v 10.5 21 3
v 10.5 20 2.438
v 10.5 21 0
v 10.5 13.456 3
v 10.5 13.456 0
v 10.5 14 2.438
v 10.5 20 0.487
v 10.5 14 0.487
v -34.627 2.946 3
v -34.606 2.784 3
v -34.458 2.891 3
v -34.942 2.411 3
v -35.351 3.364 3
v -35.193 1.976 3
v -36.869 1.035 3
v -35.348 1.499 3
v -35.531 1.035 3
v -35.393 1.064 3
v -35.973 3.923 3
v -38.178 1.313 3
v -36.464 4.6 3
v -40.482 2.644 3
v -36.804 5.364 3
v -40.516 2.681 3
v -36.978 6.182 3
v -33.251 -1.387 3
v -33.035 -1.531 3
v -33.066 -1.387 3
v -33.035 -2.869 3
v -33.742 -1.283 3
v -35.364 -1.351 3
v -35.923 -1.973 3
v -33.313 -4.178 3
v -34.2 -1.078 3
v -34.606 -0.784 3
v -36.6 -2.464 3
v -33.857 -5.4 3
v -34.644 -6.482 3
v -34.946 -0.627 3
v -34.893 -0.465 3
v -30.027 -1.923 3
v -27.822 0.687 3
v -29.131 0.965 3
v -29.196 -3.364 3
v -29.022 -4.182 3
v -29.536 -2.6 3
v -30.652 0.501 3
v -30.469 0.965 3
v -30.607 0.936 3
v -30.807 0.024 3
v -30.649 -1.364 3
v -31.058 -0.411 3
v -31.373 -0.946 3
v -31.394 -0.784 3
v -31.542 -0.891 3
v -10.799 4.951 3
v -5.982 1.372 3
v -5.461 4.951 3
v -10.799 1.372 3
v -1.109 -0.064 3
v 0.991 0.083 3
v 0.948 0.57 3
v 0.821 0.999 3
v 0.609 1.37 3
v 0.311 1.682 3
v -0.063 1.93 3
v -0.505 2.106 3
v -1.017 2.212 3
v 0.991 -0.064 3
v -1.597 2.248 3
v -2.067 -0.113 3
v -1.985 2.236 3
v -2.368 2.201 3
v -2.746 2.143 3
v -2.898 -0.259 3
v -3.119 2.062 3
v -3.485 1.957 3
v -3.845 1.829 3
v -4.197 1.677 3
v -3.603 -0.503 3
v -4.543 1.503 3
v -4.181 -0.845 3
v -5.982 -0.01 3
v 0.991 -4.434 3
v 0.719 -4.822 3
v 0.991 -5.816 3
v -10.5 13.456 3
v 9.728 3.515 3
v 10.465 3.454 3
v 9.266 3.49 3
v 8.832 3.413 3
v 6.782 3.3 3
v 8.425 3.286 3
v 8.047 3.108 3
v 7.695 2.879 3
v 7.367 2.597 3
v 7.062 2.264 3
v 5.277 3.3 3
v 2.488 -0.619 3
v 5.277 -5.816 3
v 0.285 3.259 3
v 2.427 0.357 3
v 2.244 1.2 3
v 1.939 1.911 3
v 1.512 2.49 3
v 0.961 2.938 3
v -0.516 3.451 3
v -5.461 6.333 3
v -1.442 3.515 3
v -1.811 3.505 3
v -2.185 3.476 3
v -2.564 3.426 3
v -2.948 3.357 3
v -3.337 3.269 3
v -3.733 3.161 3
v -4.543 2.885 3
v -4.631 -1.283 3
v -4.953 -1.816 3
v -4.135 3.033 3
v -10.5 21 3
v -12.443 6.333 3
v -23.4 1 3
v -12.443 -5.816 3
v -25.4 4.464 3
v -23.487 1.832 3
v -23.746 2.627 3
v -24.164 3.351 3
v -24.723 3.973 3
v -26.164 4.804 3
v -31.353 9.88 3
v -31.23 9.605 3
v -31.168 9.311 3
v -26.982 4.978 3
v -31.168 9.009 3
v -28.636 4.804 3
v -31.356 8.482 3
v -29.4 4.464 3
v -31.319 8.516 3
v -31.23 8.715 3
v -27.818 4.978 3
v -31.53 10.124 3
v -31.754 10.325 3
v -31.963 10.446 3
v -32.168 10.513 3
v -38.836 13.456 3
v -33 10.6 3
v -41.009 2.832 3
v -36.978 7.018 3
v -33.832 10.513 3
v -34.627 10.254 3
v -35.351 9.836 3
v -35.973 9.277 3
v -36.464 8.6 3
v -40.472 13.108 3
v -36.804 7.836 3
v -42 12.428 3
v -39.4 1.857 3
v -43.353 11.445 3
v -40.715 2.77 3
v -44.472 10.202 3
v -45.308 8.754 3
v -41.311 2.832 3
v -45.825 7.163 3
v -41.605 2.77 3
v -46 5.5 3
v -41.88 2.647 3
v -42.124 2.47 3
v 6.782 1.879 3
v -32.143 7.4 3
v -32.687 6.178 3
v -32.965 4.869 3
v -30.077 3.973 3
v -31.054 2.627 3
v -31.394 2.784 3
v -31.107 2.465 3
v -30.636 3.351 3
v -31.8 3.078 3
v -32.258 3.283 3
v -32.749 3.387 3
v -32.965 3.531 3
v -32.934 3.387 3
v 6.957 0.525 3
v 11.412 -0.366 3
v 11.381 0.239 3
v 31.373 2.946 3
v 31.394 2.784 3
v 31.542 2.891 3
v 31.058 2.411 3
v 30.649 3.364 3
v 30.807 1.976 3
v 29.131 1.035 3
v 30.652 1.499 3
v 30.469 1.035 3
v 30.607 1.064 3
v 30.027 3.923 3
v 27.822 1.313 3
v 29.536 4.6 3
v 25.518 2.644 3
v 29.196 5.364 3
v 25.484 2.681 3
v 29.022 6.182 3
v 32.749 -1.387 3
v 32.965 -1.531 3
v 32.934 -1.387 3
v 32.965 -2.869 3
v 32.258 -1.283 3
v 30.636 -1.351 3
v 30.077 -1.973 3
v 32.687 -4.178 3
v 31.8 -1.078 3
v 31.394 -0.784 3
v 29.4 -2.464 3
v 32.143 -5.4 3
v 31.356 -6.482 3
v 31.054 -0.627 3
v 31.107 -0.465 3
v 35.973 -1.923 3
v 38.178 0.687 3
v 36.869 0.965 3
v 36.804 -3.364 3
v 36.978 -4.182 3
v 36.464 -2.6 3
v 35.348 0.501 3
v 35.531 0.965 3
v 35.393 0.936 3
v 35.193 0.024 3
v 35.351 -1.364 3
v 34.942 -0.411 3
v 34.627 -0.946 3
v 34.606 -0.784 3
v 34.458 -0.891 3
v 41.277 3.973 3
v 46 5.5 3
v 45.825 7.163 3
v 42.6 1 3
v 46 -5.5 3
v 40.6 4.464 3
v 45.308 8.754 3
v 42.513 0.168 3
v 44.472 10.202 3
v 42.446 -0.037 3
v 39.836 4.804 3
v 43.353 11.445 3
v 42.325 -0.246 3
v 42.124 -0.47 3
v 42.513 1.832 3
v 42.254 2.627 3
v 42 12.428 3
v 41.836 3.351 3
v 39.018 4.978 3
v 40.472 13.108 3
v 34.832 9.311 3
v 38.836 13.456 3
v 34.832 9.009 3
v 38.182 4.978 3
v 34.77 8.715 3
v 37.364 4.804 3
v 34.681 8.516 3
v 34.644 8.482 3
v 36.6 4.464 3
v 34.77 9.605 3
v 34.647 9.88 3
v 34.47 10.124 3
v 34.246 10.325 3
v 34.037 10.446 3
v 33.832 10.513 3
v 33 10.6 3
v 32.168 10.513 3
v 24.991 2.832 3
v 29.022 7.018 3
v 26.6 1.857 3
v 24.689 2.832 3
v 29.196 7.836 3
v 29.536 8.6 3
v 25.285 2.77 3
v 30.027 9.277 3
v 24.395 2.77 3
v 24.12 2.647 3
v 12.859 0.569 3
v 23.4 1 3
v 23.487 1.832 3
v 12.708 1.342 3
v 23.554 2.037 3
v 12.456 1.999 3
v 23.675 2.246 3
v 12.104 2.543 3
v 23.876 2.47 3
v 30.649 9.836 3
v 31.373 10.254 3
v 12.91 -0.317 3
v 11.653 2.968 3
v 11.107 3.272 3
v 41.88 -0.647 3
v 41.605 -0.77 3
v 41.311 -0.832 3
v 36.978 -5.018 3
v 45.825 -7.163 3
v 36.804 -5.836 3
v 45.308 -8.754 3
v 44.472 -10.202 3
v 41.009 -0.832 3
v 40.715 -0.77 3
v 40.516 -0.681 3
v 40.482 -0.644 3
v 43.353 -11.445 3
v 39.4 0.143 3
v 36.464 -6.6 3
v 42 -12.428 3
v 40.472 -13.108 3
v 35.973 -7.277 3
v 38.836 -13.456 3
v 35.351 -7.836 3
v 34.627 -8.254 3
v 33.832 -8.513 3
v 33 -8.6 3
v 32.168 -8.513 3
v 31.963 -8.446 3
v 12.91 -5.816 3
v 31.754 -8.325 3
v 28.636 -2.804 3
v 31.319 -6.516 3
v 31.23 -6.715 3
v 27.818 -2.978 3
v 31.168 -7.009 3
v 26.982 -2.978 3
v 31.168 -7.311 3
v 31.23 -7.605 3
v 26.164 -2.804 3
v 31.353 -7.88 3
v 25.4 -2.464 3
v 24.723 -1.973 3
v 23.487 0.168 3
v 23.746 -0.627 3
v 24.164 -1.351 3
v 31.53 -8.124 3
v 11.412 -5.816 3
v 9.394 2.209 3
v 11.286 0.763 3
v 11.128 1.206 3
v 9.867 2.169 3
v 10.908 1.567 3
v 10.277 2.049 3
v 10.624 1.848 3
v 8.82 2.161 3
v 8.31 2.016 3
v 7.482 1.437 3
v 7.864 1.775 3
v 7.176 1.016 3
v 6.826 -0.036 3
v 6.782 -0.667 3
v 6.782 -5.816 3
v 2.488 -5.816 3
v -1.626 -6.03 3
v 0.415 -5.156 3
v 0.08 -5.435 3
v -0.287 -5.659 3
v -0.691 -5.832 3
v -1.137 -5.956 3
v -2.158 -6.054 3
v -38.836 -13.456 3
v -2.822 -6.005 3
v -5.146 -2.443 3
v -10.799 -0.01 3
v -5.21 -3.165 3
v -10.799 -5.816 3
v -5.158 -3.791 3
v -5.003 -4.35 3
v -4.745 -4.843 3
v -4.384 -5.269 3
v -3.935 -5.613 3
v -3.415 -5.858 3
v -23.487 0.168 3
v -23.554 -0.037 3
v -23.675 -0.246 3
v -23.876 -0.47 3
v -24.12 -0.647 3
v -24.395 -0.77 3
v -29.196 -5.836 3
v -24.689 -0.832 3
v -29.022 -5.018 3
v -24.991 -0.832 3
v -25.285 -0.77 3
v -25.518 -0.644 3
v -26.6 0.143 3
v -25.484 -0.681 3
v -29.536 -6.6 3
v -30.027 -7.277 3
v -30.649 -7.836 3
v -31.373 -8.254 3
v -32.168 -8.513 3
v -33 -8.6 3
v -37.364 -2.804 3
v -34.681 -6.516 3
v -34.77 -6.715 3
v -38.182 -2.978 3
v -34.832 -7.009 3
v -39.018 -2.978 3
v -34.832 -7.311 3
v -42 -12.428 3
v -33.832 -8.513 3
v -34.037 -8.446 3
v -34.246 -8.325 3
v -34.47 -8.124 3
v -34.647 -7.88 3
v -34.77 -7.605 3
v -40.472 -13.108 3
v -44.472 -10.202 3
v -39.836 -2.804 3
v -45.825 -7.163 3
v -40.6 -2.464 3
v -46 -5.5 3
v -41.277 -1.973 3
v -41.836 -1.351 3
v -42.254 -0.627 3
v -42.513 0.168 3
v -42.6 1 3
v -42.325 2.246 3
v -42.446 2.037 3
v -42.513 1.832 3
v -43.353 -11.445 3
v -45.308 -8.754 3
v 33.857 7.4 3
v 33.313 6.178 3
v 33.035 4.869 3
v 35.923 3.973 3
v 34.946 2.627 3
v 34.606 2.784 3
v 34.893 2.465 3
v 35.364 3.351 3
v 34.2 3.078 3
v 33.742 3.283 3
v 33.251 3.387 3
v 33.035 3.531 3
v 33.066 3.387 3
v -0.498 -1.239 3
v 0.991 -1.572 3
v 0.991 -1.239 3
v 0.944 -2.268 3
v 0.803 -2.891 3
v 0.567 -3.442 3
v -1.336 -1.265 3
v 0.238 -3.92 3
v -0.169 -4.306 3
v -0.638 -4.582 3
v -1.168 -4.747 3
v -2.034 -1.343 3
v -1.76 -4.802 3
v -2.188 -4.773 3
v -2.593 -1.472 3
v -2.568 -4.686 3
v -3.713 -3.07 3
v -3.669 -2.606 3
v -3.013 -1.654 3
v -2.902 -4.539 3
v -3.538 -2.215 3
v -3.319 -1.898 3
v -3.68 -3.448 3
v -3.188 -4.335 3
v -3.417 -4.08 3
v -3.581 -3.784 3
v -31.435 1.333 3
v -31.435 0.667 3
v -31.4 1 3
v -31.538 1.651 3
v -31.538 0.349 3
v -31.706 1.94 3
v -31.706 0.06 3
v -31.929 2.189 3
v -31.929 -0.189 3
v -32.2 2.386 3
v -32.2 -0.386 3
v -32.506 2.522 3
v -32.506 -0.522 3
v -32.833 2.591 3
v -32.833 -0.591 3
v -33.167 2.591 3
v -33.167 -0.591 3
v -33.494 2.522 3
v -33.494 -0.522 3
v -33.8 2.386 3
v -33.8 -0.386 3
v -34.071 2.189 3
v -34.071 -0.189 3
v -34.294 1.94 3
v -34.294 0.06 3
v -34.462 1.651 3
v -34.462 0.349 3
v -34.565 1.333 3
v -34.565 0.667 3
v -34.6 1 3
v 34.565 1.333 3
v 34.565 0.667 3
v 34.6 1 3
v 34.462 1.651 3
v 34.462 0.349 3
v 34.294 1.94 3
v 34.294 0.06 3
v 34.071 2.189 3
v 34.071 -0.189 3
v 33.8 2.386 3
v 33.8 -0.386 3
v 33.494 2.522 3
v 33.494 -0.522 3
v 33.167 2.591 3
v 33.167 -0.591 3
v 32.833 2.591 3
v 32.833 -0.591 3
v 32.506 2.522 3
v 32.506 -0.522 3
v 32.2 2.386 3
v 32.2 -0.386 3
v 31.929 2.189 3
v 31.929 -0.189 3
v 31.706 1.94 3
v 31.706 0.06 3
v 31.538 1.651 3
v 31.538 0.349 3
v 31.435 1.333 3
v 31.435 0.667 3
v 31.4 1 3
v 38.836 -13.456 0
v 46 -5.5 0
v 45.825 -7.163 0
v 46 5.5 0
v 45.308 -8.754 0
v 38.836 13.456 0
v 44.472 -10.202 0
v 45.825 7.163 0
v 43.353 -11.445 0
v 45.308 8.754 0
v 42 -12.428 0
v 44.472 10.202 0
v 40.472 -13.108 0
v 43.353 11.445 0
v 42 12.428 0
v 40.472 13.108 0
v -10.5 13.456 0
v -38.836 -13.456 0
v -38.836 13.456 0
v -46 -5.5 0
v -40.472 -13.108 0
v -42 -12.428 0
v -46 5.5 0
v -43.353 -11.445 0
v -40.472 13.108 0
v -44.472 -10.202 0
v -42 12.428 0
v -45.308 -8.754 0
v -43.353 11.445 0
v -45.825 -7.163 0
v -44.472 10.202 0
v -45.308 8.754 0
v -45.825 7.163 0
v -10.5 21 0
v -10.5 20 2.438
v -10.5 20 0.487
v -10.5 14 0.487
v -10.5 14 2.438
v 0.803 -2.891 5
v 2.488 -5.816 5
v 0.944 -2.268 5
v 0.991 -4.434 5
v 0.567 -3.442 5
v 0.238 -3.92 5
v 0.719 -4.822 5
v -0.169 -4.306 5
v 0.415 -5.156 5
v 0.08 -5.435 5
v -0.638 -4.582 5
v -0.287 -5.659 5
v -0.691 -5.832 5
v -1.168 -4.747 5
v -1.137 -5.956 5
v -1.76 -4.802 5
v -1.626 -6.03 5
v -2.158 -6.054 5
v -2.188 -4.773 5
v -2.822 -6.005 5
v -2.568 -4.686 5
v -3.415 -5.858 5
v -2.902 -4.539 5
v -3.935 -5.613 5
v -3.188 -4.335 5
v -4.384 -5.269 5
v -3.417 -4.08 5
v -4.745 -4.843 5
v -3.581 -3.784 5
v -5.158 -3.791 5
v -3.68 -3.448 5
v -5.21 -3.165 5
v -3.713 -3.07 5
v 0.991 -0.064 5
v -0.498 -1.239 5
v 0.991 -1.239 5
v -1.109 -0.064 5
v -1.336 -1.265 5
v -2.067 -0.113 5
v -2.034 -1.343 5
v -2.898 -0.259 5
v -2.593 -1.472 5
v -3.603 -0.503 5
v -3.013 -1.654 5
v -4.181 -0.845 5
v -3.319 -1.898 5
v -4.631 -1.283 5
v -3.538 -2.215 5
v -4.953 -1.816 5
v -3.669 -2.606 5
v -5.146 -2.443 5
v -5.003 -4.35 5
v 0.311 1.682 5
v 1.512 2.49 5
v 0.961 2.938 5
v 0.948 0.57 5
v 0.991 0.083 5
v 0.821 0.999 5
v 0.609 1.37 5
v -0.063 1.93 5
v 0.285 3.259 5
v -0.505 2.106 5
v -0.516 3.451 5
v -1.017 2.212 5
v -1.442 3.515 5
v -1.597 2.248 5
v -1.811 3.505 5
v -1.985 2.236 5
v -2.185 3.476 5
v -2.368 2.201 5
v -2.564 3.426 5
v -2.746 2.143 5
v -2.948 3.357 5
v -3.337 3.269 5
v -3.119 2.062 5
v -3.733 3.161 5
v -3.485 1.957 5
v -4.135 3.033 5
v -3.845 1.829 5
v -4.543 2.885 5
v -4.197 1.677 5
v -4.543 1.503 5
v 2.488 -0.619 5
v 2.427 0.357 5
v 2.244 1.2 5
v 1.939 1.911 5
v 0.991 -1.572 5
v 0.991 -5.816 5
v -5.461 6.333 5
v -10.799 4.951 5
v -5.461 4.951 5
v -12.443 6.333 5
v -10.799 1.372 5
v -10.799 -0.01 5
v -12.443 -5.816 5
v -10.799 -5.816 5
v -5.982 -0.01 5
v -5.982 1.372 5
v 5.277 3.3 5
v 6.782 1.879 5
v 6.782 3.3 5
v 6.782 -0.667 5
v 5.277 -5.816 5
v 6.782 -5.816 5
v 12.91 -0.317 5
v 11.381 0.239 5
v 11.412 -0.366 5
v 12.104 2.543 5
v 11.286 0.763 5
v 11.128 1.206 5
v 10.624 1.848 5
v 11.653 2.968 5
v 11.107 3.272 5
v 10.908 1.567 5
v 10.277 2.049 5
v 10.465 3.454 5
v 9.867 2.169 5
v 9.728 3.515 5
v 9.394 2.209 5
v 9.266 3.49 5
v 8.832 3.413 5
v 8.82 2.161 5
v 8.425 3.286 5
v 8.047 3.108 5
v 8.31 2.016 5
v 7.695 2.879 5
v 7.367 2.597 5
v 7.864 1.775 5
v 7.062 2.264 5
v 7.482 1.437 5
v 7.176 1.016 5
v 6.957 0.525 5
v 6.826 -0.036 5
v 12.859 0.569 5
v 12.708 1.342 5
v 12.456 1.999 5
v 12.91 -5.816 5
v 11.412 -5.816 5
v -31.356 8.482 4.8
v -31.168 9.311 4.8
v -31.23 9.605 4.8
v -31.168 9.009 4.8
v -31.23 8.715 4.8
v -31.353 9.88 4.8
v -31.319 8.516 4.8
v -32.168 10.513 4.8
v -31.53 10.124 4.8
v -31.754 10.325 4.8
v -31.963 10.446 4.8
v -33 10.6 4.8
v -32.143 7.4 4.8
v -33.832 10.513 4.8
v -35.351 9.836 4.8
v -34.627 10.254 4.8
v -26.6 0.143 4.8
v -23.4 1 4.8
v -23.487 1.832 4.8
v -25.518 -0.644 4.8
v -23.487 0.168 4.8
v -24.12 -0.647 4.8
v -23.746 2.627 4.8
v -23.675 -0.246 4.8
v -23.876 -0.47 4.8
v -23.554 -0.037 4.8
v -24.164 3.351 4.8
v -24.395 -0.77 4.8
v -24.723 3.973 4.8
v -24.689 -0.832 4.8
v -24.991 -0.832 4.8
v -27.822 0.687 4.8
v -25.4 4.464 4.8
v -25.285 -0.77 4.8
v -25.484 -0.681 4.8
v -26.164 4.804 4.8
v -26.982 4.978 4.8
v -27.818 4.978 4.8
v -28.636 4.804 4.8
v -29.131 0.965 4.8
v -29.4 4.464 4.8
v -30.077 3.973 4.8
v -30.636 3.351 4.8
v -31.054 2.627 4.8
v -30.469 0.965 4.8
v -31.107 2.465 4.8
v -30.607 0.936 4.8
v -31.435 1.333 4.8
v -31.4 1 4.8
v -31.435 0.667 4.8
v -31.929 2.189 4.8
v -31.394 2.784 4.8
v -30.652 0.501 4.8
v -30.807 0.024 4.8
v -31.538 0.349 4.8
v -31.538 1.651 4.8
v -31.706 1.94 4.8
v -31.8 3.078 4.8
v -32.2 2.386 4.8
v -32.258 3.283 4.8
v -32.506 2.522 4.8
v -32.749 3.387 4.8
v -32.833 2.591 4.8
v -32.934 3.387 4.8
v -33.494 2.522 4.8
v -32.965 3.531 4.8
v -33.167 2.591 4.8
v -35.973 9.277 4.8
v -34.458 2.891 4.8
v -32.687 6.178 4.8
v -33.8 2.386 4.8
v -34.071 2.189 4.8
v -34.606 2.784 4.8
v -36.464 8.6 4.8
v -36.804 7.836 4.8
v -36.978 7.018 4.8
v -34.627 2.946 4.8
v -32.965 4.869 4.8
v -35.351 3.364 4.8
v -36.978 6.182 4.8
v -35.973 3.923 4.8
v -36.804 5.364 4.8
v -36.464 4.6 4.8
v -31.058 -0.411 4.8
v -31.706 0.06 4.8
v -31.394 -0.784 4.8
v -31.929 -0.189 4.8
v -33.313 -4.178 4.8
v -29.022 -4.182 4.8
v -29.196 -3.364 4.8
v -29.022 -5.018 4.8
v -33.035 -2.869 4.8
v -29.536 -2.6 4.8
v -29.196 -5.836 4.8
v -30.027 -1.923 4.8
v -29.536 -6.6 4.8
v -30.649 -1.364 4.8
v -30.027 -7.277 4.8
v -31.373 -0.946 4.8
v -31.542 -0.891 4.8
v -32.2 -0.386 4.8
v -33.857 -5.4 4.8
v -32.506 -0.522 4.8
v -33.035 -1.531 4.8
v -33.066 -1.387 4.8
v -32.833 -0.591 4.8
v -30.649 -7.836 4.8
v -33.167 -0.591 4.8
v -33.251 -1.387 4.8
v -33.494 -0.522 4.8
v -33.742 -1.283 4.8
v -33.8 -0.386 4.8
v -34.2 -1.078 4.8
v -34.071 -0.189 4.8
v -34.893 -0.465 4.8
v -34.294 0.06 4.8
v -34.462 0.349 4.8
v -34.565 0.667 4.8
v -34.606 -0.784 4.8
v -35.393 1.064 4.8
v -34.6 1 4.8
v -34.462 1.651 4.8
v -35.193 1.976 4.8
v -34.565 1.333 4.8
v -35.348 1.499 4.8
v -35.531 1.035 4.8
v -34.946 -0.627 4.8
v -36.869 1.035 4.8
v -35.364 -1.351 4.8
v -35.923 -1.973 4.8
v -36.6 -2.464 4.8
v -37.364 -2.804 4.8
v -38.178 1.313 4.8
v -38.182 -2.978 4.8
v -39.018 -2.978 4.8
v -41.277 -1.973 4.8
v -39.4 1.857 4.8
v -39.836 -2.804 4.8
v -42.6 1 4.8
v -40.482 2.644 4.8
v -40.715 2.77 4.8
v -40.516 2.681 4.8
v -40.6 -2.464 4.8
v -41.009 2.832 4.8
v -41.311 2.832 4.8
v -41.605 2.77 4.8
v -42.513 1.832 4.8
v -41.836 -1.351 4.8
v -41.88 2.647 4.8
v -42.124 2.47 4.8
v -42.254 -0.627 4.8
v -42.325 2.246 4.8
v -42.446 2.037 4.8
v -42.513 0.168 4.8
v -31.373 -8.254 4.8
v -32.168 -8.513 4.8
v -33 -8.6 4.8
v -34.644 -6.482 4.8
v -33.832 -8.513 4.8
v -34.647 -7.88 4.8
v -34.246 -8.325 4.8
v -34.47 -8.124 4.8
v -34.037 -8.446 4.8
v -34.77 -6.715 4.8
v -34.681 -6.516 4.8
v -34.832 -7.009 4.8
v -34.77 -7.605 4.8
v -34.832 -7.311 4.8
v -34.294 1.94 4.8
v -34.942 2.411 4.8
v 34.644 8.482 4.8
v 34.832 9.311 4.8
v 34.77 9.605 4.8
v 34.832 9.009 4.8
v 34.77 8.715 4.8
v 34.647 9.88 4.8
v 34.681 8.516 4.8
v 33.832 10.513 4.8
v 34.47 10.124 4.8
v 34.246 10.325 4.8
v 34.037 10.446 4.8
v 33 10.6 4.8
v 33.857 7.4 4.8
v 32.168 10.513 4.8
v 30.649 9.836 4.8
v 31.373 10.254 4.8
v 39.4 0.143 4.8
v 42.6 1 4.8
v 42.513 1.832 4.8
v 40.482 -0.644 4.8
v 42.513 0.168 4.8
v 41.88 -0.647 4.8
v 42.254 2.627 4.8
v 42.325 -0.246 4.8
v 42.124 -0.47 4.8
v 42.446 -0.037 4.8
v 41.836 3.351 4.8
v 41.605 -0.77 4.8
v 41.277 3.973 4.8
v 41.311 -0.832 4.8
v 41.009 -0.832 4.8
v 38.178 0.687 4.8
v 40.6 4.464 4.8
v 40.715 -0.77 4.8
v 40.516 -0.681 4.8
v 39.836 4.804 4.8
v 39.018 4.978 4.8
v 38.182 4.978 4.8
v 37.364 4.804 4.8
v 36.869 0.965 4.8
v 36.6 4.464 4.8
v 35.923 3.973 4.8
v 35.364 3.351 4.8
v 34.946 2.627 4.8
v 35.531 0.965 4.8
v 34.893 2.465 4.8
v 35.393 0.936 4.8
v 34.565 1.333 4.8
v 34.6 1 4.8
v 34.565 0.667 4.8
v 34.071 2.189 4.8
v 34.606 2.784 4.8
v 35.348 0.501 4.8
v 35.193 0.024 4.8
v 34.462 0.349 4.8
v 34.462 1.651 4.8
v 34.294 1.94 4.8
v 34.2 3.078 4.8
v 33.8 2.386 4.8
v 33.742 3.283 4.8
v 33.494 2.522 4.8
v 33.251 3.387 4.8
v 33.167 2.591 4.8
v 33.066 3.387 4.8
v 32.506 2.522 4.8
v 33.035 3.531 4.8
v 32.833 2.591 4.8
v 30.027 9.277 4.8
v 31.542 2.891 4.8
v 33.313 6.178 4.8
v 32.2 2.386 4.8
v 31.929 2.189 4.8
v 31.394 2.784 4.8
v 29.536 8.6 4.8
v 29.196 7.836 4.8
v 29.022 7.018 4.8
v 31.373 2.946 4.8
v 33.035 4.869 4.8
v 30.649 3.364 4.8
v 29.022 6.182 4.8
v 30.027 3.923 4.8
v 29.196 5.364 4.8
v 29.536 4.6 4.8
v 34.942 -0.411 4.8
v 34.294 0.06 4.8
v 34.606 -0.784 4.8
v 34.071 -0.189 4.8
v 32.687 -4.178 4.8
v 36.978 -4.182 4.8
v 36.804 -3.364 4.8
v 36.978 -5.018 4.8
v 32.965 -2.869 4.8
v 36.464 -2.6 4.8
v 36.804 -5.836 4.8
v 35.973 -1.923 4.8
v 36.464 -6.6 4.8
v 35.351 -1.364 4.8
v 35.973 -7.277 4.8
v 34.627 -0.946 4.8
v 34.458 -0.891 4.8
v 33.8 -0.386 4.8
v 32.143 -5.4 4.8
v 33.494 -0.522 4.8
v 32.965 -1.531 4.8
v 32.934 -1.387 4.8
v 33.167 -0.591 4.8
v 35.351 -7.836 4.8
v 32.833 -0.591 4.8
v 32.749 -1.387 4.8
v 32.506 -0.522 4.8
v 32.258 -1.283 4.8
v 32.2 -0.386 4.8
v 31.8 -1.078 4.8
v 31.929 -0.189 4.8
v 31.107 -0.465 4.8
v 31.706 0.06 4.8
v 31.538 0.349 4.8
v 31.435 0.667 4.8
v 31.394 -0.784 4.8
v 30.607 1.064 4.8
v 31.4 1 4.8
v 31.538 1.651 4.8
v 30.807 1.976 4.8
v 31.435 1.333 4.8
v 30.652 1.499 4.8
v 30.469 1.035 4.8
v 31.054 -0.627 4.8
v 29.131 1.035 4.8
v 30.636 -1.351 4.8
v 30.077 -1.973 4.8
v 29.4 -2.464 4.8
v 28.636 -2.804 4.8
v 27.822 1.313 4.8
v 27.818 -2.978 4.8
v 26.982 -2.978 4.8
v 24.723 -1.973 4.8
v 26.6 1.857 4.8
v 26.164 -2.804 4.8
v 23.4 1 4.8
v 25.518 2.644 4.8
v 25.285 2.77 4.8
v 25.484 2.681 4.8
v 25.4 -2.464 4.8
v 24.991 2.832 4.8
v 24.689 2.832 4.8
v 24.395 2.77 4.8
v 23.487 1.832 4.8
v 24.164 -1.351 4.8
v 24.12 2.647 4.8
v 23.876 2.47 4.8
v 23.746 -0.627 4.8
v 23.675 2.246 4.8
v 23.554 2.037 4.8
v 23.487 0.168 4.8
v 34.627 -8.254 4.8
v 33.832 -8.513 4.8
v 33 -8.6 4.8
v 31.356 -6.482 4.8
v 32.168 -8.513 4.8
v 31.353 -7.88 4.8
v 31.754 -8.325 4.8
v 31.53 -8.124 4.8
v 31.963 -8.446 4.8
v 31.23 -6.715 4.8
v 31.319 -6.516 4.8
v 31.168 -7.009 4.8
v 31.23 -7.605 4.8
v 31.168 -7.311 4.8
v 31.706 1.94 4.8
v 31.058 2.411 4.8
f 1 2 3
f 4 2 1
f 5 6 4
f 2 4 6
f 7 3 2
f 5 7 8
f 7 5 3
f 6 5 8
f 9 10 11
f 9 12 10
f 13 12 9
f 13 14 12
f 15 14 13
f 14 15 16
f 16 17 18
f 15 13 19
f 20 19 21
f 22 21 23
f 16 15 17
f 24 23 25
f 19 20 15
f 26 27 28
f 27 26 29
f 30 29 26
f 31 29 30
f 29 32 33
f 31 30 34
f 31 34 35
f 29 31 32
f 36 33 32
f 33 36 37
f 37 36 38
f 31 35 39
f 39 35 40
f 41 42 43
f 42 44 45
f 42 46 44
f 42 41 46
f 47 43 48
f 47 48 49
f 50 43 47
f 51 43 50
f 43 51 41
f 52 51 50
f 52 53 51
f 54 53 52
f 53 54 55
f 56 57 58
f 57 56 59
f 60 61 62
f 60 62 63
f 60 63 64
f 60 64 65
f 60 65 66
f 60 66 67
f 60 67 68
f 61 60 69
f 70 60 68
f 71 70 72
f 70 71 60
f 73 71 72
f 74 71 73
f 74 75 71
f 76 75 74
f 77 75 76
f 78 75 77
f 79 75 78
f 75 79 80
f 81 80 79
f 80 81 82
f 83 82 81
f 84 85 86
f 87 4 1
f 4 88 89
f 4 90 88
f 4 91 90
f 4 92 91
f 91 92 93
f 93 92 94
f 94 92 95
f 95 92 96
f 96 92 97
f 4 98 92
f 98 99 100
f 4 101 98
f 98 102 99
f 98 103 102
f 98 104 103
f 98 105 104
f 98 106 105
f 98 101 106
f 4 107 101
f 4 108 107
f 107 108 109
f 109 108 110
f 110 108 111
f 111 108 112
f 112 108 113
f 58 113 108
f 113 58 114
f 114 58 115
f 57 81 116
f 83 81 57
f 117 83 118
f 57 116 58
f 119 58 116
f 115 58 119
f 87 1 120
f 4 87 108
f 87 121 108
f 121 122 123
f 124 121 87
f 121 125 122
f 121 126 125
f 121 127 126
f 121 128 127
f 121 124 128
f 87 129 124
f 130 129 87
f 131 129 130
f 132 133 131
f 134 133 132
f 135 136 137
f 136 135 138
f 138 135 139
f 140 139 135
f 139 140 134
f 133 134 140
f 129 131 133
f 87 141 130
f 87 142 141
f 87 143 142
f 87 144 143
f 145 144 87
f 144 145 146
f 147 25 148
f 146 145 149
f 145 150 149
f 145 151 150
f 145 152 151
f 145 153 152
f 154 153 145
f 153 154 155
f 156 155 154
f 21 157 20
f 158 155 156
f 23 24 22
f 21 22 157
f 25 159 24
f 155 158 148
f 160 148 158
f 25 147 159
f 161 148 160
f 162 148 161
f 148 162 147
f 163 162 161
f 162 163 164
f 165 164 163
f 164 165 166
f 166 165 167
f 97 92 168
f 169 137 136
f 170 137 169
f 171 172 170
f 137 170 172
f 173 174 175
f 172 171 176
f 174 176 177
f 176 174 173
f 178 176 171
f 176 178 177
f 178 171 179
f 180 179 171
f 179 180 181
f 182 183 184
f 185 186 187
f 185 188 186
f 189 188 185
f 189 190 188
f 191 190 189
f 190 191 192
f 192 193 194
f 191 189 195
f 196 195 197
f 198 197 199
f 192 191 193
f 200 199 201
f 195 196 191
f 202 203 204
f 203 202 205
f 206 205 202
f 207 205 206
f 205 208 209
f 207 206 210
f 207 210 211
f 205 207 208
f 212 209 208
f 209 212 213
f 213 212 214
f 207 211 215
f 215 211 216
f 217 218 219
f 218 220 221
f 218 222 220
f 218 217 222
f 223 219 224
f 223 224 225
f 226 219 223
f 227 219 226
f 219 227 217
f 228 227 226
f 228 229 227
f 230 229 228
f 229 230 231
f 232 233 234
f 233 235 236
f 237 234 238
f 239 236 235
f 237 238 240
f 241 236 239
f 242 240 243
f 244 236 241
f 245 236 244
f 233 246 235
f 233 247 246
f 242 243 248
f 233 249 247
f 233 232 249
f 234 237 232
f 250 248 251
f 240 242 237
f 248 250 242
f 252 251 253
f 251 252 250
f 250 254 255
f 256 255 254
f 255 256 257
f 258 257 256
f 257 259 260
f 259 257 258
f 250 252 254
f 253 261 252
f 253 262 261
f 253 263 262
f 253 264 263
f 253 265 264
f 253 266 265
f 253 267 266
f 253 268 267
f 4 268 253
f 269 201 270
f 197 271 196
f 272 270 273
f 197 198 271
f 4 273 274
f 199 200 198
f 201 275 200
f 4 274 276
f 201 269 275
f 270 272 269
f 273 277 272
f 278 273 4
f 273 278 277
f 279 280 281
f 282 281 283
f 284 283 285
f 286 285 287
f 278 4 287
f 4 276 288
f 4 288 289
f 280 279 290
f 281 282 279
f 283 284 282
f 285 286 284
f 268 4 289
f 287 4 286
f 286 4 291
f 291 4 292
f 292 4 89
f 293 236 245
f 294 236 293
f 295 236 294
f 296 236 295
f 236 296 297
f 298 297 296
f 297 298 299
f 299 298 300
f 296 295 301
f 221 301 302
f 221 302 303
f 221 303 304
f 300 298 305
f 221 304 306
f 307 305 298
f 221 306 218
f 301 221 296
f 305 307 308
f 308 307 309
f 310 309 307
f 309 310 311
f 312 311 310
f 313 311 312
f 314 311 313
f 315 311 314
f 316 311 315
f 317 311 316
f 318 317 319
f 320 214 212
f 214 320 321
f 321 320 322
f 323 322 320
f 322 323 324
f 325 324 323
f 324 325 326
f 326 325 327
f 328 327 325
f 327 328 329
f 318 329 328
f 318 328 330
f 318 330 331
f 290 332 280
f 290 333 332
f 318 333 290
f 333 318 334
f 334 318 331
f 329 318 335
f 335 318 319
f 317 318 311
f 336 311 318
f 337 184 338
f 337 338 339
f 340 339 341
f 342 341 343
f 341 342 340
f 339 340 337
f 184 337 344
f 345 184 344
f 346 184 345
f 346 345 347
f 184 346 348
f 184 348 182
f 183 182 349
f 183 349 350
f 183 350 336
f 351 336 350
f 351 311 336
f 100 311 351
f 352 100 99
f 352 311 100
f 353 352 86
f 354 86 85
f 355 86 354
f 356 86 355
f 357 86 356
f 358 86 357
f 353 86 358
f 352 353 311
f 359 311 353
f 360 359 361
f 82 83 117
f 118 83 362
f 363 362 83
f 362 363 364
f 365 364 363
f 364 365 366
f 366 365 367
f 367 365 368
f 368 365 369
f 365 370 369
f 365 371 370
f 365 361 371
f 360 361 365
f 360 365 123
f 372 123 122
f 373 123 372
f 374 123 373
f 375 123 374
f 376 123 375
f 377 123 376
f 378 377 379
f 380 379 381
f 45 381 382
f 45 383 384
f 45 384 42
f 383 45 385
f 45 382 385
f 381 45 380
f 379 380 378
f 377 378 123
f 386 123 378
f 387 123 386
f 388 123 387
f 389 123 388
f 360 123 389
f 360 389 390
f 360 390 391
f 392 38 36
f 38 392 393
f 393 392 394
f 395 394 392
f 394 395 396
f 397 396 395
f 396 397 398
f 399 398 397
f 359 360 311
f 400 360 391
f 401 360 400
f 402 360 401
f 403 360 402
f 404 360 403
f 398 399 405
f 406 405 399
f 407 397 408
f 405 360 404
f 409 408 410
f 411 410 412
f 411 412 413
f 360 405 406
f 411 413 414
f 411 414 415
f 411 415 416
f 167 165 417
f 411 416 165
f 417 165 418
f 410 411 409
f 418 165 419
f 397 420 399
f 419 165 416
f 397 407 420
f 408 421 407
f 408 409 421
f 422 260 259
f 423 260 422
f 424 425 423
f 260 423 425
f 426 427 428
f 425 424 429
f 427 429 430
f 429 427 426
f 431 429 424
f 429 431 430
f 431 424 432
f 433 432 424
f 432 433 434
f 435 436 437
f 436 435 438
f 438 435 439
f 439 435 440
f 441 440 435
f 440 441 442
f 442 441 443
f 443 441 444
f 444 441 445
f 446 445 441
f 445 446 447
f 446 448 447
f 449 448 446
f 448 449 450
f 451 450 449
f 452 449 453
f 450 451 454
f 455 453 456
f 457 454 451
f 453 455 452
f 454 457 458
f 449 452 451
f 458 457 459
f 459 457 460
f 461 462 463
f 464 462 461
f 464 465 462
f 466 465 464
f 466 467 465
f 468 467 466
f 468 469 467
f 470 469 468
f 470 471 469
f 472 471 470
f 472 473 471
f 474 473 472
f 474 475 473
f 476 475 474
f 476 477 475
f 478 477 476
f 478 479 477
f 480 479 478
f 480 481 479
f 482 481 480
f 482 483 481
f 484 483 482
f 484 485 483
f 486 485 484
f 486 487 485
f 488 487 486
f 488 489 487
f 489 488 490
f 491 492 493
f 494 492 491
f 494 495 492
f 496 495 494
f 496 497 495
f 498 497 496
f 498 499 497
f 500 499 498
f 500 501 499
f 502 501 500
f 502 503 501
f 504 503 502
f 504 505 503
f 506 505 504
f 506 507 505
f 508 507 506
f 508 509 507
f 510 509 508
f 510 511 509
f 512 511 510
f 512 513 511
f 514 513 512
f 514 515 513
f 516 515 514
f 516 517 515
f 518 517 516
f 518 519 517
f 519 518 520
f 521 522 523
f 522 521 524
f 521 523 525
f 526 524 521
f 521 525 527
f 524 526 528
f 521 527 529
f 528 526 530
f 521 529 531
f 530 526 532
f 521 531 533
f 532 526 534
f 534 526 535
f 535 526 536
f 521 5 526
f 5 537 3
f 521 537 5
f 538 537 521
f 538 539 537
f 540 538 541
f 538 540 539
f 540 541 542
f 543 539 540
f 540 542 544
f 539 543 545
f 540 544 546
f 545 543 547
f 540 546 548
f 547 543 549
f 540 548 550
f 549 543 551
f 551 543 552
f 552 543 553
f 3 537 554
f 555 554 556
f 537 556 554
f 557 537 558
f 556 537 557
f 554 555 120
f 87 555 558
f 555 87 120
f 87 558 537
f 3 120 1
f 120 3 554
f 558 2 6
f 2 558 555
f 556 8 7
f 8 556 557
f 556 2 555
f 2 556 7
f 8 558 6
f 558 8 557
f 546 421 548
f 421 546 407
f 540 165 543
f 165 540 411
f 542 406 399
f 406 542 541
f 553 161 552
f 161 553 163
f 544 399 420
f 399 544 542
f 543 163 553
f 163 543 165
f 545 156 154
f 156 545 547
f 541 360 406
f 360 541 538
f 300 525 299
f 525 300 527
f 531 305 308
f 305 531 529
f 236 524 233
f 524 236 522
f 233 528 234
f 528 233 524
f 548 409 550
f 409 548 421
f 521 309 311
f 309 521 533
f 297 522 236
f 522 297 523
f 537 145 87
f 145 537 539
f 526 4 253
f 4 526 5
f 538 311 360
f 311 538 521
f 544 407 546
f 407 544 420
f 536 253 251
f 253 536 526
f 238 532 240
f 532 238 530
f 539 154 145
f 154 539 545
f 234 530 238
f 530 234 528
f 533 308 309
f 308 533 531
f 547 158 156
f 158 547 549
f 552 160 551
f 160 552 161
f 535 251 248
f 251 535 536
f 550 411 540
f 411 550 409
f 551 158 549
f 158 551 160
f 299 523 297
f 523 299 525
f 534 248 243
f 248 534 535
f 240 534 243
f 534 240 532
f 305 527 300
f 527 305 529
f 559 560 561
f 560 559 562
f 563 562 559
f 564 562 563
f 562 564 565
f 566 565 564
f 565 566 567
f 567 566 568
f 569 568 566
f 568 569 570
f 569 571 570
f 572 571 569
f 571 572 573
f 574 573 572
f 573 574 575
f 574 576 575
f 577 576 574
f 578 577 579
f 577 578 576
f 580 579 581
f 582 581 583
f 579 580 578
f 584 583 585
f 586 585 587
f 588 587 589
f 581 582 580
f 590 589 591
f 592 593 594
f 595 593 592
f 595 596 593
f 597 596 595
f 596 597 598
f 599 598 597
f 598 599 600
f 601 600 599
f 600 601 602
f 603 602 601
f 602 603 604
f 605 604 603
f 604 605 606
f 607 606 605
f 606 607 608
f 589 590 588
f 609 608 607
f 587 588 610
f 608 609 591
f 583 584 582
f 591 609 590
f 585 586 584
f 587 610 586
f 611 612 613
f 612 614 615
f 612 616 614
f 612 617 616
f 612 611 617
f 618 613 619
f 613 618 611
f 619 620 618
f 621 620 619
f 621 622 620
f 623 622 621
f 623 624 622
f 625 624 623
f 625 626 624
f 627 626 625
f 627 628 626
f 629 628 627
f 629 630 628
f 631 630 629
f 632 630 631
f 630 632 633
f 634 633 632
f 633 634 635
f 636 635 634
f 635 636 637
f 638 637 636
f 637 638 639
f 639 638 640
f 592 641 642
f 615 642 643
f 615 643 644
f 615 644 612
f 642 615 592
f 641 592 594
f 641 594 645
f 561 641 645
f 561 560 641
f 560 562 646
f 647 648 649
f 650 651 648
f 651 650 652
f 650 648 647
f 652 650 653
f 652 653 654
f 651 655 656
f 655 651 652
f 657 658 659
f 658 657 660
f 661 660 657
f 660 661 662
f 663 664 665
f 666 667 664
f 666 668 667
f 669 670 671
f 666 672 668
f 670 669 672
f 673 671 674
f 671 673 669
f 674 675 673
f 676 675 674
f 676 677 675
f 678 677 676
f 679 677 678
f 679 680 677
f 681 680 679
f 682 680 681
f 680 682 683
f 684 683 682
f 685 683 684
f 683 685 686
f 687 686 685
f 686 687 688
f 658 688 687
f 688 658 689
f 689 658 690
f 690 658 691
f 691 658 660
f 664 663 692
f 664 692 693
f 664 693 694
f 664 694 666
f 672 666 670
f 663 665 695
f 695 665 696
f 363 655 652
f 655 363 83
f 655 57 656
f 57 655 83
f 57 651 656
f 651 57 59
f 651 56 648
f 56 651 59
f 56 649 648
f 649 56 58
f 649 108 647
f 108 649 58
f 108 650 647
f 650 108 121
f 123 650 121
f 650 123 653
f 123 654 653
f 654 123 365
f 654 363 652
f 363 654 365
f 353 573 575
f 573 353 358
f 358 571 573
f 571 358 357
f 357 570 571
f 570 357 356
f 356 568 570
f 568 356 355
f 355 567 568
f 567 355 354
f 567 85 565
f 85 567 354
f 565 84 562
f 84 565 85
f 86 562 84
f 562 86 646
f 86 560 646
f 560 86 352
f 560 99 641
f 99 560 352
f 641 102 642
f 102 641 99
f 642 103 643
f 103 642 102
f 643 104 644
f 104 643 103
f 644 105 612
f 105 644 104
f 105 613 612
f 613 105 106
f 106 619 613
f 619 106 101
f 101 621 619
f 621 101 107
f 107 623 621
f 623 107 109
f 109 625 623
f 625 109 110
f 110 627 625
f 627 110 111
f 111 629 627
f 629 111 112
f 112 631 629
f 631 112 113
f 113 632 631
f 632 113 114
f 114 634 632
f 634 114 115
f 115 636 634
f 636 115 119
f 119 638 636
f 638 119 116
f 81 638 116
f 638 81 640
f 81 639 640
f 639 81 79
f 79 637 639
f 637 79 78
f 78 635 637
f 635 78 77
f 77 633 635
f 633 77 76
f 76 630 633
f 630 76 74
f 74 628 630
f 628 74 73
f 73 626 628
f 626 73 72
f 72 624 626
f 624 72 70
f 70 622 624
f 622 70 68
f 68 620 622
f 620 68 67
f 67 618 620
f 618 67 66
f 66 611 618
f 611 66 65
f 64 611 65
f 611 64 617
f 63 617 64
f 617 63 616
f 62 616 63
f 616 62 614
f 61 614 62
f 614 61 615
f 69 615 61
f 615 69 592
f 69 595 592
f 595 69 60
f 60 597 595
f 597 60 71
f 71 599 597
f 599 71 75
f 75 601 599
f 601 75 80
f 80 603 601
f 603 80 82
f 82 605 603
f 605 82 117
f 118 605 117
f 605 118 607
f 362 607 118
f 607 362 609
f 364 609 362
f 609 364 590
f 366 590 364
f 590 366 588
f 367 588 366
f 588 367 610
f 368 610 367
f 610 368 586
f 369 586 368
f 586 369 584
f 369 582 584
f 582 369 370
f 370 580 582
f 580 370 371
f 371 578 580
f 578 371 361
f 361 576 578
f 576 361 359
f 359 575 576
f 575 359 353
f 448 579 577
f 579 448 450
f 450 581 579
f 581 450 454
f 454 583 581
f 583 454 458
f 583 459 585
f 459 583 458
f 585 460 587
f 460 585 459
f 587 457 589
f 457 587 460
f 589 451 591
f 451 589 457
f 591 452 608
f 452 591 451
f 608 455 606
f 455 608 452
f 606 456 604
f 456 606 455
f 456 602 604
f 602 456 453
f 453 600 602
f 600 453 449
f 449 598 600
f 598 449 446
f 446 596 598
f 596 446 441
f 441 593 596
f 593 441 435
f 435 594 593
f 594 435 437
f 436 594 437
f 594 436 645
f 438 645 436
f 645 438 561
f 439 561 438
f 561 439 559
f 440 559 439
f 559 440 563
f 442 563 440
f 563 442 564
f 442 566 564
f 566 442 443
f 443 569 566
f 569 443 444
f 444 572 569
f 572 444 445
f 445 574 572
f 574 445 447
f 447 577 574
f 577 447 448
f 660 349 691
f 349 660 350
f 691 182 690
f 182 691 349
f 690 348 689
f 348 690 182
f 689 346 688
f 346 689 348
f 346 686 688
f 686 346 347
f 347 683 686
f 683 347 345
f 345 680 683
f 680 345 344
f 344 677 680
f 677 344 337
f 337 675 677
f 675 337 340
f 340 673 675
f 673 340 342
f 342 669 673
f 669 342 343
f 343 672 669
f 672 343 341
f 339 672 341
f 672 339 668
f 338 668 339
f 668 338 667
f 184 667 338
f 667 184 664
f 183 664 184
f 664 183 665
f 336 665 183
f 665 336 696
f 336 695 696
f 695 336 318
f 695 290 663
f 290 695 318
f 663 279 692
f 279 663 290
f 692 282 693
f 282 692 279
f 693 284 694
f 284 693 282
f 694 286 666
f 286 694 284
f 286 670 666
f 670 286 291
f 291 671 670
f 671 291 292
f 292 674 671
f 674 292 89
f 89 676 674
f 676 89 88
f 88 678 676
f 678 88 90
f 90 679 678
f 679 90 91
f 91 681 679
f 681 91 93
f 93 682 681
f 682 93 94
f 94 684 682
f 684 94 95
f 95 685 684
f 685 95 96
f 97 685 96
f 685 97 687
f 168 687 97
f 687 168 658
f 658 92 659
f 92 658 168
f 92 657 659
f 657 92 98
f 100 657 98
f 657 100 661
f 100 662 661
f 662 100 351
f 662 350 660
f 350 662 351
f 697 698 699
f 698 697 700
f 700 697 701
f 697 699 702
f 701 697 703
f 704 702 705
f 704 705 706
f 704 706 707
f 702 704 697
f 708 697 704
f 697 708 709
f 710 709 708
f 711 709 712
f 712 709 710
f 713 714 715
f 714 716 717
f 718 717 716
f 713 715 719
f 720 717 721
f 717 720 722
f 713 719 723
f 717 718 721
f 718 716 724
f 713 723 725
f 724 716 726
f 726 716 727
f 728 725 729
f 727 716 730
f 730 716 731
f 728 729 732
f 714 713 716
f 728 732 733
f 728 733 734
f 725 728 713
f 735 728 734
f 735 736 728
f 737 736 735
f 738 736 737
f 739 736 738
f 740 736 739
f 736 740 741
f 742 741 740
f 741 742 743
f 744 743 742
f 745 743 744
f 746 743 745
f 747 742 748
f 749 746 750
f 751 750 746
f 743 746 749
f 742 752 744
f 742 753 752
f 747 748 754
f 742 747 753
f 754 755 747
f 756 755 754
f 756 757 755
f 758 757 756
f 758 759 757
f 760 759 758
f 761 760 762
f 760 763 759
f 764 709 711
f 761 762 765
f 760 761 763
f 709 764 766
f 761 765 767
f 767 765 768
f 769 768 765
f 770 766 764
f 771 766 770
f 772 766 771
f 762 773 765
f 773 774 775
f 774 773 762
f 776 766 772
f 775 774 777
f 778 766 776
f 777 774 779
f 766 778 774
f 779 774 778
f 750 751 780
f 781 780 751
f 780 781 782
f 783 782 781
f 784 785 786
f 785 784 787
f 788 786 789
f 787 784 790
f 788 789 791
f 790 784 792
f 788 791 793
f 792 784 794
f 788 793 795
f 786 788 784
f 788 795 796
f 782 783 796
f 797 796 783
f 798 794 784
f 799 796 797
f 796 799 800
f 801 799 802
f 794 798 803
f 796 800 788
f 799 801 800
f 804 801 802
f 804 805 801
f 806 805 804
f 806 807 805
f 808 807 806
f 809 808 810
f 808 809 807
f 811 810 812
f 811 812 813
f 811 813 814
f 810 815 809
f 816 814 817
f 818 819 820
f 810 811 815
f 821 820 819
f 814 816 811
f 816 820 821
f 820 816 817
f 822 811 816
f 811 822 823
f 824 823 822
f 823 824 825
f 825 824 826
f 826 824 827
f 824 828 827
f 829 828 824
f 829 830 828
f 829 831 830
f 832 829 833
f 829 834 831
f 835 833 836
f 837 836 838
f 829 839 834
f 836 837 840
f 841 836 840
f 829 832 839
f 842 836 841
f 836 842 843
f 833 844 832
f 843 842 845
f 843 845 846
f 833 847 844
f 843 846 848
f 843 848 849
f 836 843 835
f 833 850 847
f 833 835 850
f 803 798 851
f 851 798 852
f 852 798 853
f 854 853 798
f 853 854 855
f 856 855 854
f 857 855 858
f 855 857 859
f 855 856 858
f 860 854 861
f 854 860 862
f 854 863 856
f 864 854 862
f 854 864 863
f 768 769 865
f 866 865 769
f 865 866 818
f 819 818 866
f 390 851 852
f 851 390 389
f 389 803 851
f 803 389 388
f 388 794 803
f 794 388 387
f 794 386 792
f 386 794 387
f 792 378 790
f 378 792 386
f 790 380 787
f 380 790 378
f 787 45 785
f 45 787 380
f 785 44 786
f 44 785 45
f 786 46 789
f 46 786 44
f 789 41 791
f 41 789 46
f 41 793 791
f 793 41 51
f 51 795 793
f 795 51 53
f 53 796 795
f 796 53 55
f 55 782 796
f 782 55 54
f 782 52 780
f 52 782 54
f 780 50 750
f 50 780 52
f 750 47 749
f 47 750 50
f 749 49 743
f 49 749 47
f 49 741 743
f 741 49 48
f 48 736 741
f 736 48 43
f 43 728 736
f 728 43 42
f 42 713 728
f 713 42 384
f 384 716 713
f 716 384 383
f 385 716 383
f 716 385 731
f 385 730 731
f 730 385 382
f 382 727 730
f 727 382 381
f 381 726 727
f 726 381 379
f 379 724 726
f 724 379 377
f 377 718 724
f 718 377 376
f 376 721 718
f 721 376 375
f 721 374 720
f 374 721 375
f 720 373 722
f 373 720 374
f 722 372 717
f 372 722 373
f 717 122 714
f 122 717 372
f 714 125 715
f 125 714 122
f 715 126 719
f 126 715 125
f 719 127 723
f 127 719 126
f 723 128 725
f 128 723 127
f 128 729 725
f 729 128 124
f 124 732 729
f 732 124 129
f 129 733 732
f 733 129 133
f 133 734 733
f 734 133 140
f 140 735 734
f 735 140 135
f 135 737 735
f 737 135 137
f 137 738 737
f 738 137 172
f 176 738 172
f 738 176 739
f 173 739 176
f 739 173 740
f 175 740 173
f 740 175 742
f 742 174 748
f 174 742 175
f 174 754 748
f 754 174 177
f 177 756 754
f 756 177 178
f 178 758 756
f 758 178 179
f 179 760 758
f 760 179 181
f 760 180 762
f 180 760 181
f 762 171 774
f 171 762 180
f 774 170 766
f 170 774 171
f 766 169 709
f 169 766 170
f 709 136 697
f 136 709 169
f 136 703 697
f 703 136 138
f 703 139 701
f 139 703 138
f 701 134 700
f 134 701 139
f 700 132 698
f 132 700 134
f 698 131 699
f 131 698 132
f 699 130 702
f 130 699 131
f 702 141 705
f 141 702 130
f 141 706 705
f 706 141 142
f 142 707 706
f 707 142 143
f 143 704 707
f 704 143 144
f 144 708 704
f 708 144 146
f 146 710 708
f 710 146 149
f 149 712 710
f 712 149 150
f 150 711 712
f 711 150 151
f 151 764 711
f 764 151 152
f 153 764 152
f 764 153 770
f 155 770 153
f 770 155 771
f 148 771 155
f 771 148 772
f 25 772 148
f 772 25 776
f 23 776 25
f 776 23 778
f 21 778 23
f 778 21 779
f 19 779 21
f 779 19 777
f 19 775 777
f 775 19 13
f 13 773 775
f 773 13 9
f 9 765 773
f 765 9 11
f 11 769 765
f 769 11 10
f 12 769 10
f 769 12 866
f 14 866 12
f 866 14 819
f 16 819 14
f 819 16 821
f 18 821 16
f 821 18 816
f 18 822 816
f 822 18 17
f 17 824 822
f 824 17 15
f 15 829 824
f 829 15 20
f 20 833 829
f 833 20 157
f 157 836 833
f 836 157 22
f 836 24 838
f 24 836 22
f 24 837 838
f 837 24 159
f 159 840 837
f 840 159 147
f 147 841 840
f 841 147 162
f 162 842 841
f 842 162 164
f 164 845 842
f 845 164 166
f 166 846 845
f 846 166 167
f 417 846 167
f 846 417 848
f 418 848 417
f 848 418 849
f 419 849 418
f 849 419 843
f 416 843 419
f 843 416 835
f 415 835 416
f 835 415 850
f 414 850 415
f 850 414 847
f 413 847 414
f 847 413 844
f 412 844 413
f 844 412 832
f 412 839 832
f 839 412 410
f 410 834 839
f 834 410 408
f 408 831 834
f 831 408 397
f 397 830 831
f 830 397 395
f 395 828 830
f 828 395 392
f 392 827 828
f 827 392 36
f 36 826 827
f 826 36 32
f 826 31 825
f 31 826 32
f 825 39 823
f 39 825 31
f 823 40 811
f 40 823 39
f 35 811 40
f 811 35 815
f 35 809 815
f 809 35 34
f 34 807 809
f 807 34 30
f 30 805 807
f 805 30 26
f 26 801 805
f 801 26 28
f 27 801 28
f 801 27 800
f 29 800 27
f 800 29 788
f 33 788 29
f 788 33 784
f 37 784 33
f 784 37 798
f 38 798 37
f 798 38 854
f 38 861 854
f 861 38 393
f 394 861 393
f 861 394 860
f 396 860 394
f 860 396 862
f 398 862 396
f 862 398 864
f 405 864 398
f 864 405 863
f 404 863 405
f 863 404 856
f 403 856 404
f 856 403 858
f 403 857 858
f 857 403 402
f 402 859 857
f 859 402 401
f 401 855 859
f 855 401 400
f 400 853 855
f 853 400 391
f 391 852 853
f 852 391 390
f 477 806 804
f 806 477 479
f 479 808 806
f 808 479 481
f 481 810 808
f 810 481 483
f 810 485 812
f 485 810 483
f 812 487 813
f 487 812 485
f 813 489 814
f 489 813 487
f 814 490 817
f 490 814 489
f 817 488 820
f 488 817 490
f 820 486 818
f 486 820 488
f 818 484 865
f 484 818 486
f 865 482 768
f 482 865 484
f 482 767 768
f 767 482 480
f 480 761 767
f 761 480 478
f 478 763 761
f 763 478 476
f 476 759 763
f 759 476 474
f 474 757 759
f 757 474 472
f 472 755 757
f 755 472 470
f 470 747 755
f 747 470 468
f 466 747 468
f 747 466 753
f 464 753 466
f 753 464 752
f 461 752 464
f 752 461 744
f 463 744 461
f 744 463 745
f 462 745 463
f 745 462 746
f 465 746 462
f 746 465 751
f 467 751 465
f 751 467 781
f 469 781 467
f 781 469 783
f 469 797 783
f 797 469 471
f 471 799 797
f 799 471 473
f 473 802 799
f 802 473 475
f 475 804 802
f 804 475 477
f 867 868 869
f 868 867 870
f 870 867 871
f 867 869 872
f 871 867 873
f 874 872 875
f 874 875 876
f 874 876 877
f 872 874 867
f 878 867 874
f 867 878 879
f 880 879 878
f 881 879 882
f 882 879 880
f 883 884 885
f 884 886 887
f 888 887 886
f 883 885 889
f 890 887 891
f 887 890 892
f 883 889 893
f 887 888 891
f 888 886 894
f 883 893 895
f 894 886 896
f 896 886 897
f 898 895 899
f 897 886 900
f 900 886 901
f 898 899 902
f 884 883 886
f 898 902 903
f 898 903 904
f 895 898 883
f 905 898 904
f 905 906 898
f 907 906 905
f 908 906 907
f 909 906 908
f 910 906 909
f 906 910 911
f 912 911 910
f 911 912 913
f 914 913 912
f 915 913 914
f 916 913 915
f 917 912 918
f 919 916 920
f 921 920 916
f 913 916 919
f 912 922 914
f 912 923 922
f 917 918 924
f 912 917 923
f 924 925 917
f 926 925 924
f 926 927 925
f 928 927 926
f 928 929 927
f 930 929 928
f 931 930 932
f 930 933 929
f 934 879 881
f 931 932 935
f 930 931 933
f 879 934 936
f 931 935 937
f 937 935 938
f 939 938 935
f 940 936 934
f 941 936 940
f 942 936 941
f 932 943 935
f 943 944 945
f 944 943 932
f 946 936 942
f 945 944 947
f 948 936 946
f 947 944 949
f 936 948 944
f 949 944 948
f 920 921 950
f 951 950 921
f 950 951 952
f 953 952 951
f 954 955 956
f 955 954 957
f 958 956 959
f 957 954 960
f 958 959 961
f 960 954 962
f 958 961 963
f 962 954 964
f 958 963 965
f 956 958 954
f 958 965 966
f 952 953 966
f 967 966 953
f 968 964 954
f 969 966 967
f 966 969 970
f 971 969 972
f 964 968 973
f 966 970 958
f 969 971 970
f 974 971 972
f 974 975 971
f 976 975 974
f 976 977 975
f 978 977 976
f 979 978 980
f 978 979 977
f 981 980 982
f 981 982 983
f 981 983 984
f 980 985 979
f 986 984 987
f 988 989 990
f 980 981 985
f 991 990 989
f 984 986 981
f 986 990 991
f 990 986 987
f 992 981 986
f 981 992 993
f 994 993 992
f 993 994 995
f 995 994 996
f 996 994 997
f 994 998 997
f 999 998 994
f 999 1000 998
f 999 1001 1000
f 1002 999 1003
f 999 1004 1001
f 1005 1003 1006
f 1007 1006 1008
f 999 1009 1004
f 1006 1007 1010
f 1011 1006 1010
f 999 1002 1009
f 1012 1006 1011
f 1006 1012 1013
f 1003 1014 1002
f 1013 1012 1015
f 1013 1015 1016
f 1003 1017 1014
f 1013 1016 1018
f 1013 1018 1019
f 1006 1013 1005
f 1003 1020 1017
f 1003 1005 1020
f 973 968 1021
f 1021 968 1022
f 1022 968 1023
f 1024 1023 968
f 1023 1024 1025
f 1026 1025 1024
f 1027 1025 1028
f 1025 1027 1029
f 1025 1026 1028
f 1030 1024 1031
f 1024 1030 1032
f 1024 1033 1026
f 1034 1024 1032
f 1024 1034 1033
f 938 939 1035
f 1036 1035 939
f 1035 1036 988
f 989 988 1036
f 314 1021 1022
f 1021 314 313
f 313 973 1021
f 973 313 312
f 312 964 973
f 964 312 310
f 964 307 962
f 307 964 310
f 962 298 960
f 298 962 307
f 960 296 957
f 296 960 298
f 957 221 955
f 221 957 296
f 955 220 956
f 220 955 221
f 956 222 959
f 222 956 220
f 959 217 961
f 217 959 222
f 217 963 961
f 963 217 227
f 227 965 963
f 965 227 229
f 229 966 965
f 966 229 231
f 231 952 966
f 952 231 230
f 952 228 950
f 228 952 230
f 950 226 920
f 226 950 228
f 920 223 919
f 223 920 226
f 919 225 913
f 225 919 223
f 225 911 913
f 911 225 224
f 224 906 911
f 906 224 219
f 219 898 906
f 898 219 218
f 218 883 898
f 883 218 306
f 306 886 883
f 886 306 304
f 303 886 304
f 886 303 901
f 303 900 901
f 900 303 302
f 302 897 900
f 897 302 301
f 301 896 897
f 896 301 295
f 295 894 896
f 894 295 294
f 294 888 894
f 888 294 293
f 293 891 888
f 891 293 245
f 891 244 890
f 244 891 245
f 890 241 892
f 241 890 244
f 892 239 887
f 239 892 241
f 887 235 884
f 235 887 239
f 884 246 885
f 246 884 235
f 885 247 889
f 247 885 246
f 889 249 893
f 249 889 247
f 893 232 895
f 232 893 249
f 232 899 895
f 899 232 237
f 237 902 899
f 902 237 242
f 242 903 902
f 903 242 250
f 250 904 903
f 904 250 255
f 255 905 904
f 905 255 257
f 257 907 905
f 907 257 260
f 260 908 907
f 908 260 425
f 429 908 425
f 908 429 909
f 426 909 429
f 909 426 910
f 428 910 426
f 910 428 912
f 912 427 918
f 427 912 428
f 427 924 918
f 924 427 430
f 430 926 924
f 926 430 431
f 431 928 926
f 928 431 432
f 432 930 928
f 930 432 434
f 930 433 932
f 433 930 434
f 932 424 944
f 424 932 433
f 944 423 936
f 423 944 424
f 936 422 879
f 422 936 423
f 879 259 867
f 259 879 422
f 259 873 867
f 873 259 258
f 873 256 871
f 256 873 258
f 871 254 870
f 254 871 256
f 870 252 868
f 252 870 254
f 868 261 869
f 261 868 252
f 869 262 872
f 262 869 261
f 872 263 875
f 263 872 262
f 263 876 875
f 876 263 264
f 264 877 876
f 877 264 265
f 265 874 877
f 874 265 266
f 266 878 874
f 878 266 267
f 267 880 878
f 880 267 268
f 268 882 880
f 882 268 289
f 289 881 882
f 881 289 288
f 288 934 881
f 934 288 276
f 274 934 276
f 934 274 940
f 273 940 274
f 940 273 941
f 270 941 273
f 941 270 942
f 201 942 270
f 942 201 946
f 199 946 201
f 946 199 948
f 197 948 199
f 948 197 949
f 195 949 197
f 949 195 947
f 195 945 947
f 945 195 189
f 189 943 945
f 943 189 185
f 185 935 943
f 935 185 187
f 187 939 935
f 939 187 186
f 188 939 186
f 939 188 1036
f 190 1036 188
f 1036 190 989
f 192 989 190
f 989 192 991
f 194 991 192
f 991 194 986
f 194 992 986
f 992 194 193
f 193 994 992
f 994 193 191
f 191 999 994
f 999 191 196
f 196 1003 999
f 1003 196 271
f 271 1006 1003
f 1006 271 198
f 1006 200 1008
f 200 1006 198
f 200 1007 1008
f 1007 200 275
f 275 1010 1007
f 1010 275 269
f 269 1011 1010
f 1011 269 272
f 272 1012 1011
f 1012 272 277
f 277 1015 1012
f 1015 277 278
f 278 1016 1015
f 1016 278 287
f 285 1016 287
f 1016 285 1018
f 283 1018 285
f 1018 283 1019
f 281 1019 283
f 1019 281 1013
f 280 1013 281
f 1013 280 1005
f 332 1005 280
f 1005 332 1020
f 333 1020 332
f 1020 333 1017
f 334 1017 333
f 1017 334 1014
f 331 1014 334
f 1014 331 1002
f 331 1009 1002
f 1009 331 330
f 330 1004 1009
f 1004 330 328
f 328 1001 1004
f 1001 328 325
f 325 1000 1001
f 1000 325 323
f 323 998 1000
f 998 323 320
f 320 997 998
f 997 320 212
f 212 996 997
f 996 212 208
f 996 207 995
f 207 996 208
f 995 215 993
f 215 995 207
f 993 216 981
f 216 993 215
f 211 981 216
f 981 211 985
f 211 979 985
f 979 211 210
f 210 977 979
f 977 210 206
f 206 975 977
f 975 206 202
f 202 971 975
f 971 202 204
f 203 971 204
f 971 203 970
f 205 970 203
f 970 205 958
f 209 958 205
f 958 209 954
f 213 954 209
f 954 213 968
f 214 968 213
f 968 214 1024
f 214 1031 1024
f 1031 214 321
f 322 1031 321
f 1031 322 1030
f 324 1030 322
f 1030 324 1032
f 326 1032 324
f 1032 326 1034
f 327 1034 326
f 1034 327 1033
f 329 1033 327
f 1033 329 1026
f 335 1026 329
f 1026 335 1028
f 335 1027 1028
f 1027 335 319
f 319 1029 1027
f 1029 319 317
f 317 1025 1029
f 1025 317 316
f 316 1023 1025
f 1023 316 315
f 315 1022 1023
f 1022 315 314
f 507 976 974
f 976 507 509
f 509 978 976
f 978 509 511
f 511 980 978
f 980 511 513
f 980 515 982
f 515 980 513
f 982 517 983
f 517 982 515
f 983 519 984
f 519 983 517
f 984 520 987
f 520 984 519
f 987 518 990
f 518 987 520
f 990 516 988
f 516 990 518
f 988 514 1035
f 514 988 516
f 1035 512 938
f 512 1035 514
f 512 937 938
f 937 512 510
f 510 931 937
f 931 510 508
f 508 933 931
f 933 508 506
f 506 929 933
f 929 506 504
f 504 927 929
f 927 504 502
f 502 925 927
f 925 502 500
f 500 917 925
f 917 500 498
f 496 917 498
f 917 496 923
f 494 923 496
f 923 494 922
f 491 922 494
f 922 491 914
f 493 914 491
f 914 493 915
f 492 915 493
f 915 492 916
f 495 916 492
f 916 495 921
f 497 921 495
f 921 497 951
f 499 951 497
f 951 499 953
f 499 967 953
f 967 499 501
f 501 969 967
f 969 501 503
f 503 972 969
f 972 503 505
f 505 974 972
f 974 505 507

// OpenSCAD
use <../../../name-tag.scad>

iconType = "Fan";
iconXyScale = 0.8;
iconHeight = 3;
        
nametag(topText="Fan",
        topTextSize = 12,
        bottomText = "",
        font="../../../write/orbitron.dxf",
        
        leftIconType = iconType,
        leftIconHeight = iconHeight,
        leftIconXyScale = iconXyScale,
        rightIconType = iconType,
        rightIconHeight = iconHeight,
        rightIconXyScale = iconXyScale,
        xIconOffset = 33,
        yIconOffset = 1,
        
        baseWidth = 80,
        baseHeight = 15,
//        showBorder = "No",
//        showBorder = "Yes",        
        chainLoop = true,
        chainLoopPosition = "top");
